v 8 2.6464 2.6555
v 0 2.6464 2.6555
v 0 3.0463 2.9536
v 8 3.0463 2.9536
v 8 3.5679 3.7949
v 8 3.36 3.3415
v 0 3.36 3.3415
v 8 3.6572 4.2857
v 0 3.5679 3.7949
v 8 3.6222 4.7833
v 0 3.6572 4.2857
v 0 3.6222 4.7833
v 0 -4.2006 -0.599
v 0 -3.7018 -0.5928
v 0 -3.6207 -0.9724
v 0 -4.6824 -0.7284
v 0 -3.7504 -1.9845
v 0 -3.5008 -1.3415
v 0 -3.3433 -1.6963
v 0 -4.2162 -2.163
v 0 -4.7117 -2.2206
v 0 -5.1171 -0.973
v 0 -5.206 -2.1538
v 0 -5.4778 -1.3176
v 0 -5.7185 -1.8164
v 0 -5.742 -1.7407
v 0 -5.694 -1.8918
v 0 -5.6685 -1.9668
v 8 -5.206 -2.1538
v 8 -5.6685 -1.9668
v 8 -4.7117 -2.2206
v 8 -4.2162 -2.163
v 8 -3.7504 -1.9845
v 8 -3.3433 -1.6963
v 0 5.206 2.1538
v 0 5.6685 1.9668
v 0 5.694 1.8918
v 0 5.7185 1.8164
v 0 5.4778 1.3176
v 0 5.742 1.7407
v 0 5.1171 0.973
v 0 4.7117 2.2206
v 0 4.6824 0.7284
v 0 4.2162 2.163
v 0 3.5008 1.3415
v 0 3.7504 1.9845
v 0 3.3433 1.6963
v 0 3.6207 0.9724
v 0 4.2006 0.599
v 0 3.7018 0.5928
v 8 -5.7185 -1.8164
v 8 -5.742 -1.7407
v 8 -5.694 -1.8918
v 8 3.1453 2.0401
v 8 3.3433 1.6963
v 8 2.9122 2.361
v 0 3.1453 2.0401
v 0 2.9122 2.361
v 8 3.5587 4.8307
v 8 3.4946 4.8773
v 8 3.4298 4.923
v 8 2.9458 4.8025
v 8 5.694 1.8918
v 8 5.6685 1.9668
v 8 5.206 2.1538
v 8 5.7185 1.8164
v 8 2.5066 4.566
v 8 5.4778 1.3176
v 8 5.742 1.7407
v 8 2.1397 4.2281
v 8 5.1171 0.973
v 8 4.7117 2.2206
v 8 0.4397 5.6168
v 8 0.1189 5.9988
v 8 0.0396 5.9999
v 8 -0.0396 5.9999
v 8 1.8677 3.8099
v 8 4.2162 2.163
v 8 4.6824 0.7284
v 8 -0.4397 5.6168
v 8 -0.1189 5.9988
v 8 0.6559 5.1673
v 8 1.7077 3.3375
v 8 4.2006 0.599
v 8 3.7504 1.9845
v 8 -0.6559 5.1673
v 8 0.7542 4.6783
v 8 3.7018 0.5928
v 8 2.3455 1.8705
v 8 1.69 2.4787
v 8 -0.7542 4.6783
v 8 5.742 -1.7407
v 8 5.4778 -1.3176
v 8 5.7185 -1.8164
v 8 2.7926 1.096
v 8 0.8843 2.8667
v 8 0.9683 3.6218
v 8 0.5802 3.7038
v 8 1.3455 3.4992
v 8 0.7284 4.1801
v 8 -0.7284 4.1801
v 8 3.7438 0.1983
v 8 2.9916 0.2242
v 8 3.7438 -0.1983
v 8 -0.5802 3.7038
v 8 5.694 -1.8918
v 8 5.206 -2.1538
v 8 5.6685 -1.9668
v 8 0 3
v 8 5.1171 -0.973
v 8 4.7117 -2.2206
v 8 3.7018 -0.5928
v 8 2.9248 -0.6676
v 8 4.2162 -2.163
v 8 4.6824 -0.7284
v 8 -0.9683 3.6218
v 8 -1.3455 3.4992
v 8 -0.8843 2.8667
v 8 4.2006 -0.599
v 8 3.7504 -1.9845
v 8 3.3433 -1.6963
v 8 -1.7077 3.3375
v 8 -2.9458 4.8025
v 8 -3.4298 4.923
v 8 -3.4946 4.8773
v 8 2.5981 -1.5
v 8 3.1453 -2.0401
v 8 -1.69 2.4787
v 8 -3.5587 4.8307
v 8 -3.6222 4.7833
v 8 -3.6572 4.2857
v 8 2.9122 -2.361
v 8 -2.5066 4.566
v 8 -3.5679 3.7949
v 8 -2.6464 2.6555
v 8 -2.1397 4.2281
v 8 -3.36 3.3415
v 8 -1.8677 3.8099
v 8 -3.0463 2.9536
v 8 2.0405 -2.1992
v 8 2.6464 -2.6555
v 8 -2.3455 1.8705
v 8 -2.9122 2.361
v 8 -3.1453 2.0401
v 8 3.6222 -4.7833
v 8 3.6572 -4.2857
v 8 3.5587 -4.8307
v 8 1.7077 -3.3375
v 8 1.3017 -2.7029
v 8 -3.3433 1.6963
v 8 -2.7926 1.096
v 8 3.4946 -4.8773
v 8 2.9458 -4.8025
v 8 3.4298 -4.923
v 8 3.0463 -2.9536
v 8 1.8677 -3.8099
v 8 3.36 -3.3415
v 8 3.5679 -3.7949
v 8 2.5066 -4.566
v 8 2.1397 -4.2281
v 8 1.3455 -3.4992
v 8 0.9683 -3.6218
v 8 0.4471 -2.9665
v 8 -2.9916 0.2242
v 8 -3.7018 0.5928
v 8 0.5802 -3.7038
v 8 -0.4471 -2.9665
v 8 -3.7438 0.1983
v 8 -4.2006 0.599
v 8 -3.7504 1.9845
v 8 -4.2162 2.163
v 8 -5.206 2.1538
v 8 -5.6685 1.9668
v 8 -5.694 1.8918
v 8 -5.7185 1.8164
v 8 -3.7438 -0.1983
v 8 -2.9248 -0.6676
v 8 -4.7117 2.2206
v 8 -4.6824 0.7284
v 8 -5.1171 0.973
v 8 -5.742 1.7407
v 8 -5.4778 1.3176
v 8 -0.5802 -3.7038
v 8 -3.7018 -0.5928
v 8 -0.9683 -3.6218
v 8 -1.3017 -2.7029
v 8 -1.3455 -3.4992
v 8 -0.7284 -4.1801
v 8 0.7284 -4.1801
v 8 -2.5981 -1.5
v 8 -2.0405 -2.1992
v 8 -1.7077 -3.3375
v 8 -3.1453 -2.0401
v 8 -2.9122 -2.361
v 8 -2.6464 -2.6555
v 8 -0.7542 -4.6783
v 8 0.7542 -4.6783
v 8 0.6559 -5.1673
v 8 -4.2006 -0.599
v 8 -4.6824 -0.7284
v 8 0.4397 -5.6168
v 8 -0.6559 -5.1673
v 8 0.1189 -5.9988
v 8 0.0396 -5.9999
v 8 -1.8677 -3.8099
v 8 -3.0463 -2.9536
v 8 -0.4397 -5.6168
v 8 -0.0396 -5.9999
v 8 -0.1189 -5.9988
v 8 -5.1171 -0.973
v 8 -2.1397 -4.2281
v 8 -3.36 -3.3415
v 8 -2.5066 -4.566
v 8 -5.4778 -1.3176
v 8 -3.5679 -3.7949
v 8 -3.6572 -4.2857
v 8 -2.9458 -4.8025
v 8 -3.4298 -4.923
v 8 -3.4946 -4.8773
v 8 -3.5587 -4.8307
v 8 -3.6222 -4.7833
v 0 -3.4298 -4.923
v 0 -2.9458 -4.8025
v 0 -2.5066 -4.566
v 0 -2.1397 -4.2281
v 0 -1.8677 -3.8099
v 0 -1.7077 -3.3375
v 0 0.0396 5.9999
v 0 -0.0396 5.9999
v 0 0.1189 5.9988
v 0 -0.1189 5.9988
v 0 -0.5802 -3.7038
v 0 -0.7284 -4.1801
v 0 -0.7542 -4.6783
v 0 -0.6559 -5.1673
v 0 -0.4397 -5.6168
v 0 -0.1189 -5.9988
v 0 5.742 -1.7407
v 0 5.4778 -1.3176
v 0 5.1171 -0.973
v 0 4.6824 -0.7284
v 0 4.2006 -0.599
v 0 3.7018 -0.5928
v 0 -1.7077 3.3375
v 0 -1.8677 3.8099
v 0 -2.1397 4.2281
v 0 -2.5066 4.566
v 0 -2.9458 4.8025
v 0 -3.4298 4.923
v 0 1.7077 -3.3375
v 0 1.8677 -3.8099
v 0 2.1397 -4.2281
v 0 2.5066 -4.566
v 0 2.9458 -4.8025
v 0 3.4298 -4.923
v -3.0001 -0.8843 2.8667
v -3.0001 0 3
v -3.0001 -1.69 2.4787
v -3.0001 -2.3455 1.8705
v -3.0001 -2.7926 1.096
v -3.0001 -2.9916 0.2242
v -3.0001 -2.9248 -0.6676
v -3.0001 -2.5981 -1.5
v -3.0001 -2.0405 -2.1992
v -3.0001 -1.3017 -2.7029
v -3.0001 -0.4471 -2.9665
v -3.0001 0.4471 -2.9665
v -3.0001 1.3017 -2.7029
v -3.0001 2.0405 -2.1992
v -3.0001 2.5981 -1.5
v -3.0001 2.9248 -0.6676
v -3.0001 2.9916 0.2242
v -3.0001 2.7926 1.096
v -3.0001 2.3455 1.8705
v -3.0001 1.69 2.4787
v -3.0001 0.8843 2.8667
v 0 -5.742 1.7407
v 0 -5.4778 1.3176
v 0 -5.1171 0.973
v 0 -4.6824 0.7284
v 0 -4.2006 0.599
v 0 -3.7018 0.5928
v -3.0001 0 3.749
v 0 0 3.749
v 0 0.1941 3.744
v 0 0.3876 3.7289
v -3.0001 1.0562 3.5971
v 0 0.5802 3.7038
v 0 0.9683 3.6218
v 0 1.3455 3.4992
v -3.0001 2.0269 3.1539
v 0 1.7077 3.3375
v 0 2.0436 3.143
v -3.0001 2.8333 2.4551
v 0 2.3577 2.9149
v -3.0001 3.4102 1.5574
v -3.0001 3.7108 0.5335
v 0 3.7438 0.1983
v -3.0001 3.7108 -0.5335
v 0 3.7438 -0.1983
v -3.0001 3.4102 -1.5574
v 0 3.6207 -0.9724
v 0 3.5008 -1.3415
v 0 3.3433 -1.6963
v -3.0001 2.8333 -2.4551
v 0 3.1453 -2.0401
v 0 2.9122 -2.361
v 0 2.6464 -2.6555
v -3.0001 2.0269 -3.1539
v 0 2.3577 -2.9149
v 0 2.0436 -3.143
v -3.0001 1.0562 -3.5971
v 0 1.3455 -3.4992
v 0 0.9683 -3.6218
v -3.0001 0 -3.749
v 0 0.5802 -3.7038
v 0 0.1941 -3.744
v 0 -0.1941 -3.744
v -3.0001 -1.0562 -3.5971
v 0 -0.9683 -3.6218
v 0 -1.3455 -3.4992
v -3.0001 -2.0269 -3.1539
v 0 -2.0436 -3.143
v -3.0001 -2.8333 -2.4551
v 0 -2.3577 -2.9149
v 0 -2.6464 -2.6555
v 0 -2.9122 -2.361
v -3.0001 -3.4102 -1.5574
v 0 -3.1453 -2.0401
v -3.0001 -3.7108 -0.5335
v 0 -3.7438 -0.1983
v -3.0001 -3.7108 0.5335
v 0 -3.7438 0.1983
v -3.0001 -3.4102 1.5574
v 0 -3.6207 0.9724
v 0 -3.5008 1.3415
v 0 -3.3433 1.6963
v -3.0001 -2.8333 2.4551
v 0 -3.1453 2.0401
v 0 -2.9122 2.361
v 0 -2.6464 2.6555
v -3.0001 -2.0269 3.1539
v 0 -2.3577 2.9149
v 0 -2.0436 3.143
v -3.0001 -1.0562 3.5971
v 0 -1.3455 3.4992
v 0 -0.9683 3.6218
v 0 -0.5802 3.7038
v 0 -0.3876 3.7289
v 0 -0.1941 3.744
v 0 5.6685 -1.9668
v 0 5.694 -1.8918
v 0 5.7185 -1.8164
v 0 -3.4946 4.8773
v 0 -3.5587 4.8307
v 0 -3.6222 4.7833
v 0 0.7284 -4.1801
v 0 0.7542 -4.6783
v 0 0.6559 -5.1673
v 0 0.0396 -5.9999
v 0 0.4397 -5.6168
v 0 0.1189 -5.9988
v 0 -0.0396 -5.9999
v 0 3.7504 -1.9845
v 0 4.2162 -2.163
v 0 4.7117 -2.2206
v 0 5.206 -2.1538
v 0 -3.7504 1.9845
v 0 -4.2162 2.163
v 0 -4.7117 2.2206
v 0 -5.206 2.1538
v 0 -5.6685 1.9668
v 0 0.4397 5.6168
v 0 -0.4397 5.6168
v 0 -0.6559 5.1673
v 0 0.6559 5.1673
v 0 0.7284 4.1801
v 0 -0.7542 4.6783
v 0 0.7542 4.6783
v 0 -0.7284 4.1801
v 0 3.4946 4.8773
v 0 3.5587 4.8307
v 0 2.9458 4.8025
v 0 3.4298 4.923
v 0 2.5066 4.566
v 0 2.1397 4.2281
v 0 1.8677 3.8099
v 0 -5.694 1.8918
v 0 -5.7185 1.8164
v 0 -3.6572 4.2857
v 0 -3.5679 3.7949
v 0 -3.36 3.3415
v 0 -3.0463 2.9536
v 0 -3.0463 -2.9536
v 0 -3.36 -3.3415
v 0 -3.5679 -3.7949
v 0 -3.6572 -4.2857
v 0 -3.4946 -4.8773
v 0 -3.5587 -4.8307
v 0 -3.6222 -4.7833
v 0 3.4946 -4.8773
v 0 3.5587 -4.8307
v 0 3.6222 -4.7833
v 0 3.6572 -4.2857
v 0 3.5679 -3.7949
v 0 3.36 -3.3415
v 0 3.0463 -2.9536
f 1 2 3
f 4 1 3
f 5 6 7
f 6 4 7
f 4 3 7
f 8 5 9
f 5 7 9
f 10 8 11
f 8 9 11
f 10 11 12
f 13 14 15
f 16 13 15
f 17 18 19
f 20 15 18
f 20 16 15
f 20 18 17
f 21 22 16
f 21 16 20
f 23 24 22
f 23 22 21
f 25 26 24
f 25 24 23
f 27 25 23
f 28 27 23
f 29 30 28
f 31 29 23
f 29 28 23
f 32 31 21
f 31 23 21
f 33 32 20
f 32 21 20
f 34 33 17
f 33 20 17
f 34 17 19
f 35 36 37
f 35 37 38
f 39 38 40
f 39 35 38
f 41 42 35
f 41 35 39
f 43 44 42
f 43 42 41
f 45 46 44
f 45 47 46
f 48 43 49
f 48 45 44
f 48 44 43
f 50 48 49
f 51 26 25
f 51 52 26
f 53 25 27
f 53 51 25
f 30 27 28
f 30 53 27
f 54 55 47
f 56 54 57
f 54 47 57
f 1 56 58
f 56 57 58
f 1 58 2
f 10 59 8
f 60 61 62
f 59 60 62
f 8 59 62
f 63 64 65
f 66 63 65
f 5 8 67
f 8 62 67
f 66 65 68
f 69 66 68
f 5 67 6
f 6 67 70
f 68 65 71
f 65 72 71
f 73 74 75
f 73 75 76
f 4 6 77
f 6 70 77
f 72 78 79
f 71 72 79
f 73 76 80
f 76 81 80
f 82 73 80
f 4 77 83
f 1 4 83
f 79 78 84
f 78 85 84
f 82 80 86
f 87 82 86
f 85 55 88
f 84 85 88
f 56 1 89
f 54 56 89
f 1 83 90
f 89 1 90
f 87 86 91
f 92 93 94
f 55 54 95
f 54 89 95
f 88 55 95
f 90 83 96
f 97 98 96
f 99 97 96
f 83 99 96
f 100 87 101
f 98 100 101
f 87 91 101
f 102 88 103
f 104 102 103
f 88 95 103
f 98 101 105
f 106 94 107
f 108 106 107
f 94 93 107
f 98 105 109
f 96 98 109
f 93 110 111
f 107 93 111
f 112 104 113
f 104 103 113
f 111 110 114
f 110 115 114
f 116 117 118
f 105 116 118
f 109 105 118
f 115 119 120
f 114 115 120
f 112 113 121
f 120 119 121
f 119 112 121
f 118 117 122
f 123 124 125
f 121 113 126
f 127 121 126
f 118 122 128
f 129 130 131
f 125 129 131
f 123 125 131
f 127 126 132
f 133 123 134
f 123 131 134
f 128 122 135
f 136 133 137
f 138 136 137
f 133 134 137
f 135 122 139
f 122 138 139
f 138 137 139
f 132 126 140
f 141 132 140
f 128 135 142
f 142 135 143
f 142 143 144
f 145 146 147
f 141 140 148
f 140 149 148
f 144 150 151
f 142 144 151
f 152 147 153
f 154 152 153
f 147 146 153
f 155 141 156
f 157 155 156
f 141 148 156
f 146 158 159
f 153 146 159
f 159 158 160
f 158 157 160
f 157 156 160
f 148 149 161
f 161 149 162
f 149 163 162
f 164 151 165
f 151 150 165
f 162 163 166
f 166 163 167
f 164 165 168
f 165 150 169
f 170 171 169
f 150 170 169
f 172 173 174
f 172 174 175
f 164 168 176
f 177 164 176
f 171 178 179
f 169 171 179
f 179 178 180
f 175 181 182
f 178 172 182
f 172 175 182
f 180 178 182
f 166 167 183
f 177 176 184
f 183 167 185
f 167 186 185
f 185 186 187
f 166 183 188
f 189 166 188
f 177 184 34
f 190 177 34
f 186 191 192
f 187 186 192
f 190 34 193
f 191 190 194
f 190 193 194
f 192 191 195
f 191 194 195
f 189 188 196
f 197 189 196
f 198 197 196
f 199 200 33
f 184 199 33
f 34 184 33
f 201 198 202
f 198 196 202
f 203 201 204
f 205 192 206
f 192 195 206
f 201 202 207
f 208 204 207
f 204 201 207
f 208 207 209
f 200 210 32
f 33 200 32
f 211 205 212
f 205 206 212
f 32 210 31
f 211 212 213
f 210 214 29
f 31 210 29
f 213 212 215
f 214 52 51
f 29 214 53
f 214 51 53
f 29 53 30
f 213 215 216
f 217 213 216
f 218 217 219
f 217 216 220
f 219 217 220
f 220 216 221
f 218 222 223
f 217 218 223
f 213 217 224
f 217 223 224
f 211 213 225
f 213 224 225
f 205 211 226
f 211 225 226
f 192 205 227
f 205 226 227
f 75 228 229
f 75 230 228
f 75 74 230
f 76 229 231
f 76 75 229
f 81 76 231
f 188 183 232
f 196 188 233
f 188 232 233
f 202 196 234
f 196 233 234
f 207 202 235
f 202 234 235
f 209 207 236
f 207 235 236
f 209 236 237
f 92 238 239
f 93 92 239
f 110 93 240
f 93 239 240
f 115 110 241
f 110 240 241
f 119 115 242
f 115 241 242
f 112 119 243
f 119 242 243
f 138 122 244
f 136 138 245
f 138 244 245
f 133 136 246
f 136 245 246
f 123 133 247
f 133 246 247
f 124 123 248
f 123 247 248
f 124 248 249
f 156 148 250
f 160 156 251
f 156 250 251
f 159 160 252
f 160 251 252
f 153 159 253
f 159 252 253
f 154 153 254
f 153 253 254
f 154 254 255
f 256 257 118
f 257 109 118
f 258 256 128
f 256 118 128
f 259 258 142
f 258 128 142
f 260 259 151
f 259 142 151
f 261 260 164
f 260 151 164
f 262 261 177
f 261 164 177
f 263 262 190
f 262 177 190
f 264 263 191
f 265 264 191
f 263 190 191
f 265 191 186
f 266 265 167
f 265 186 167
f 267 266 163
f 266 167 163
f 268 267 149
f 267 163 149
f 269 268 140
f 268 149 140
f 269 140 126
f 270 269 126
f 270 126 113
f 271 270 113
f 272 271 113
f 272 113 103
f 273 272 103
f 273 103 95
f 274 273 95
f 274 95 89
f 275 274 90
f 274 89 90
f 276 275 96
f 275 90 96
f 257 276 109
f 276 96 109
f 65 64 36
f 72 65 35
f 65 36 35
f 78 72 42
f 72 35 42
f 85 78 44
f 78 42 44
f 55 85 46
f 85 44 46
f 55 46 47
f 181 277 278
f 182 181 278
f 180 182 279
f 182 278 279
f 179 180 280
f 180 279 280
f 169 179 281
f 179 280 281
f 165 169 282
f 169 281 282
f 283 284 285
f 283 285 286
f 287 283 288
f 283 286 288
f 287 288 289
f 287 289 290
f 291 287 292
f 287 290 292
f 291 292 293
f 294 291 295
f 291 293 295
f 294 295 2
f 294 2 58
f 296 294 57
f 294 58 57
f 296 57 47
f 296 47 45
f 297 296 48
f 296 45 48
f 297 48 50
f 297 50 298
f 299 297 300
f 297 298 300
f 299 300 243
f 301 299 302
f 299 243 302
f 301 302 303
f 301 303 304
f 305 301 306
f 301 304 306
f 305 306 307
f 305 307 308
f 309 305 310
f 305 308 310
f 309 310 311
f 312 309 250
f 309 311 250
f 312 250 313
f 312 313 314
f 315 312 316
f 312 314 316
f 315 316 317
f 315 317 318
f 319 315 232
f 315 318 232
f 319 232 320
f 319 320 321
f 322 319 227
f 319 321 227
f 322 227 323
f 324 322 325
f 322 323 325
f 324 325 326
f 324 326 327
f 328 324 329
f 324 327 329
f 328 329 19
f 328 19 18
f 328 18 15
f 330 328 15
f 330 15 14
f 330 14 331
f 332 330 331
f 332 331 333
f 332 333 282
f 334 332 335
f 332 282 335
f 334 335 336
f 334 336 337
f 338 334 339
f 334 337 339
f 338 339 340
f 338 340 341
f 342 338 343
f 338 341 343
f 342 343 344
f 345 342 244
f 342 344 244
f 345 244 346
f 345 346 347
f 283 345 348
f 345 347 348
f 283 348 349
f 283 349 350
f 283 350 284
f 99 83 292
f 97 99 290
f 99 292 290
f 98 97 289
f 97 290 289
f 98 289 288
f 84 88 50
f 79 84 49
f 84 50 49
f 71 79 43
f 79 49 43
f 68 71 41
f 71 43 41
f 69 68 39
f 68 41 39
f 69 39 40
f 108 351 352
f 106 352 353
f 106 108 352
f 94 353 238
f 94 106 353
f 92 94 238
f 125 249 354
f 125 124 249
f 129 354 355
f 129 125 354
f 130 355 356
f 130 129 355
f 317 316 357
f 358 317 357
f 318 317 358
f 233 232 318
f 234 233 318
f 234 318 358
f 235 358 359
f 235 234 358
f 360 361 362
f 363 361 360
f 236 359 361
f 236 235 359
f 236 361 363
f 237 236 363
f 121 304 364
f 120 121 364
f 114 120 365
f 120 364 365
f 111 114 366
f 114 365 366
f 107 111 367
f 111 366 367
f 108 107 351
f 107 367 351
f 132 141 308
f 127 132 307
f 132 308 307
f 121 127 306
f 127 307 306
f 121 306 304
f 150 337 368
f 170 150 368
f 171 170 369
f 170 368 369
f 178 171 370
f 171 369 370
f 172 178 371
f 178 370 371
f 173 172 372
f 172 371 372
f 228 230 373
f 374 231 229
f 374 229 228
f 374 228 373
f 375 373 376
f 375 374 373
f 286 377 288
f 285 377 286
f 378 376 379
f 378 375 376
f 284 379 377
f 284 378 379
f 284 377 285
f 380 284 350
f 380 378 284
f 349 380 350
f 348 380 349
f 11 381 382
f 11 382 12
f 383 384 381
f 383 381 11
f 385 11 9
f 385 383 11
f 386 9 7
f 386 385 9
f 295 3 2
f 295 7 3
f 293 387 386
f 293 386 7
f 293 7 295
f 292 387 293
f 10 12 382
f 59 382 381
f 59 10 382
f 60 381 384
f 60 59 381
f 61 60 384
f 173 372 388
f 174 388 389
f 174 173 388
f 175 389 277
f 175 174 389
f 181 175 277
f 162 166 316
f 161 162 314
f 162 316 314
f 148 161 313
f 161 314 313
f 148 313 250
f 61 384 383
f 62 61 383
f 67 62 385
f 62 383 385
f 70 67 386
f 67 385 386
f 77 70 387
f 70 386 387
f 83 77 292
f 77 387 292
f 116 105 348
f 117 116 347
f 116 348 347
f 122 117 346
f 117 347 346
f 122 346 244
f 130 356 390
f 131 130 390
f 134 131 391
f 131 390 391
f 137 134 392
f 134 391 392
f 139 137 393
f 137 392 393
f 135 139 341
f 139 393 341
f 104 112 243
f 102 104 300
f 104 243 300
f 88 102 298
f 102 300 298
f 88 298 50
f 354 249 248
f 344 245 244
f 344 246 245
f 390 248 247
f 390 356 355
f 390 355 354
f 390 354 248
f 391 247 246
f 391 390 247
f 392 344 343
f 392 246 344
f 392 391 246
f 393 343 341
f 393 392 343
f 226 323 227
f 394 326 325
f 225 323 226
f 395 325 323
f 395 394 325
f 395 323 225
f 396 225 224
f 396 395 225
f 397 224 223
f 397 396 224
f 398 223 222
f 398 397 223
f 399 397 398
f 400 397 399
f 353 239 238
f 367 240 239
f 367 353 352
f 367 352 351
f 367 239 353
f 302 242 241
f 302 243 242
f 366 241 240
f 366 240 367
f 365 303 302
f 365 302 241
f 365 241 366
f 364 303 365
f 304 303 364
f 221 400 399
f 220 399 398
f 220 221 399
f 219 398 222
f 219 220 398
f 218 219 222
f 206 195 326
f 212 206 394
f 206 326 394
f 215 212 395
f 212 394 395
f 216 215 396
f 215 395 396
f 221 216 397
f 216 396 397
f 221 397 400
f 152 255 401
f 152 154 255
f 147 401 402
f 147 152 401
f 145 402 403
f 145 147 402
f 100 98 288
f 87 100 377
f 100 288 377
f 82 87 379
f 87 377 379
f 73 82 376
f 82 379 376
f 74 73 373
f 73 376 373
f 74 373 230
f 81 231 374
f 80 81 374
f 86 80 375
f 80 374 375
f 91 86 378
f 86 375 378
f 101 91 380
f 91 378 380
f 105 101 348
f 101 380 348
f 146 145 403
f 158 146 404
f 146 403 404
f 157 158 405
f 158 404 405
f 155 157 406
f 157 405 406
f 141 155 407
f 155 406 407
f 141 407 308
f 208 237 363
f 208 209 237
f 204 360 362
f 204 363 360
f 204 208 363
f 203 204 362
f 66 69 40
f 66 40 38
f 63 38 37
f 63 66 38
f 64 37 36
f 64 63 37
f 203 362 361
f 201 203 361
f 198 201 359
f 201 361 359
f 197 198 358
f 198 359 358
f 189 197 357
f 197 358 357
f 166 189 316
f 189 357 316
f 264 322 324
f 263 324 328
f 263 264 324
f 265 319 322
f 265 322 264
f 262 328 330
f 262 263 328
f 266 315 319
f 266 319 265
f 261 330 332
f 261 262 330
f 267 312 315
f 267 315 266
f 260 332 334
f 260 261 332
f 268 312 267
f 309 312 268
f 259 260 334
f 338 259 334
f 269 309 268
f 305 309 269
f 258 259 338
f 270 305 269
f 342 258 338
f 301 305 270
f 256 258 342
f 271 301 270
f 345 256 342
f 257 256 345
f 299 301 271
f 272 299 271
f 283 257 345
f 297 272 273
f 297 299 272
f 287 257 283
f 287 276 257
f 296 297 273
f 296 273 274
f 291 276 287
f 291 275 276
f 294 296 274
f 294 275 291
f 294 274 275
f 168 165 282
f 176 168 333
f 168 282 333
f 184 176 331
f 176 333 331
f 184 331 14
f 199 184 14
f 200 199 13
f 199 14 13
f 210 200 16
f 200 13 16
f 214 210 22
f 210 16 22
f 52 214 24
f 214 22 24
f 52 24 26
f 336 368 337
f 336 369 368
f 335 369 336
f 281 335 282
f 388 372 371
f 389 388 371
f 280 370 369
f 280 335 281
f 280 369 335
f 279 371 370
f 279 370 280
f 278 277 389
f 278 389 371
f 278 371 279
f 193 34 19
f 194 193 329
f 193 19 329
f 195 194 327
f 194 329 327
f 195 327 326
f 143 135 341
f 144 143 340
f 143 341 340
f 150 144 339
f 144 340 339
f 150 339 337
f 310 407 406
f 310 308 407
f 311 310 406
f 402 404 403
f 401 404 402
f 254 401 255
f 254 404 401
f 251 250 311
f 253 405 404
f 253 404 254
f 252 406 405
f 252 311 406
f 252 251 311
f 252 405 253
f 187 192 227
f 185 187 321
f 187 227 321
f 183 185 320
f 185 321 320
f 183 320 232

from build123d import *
from build123d.topology import SkipClean

# Parameters (mm, degrees)
BASPROSKE_W      = 8
BASPROSKE_H      = 6
TOOTHCUT_DEPTH   = 12.66190379
TEETHCUTS_COUNT  = 10
TEETHCUTS_ANGLE  = 324
HUBNEAONESKE_R   = 3.749
HUBNEARONE_DEPTH = 3.0000508
BORSKE_R         = 3
BORE_DEPTH       = 11.0000508


with BuildPart() as part:
    # BasProSke → Base-Revolve (revolve)
    with BuildSketch(Plane(origin=(0, 0, 0), x_dir=(1, 0, 0), z_dir=(0, 1, 0)), mode=Mode.PRIVATE) as base_revolve_sk:
        with Locations((4, 3)):
            Rectangle(BASPROSKE_W, BASPROSKE_H)
    revolve(base_revolve_sk.sketch.rotate(Axis((-10, 0, 0), (1, 0, 0)), 180), axis=Axis((-10, 0, 0), (1, 0, 0)))

    # TooCutSke → ToothCut (cut, through all)
    with BuildSketch(Plane(origin=(0, 0, 0), x_dir=(0, 0, -1), z_dir=(1, 0, 0))):
        with BuildLine():
            ThreePointArc((0.59278292, 3.701838653), (0, 3.749), (-0.59278292, 3.701838653))
            ThreePointArc((-0.59278292, 3.701838653), (-0.846593509, 4.924114224), (-1.775771316, 5.757784417))
            ThreePointArc((-1.775771316, 5.757784417), (0, 6.0254), (1.775771316, 5.757784417))
            ThreePointArc((1.775771316, 5.757784417), (0.846593509, 4.924114224), (0.59278292, 3.701838653))
        make_face()
    toothcut = extrude(amount=TOOTHCUT_DEPTH, mode=Mode.SUBTRACT)

    # TeethCuts: ToothCut ×10 about axis
    teethcuts_axis = Axis((0, 0, 0), (1, 0, 0))
    for i in range(1, TEETHCUTS_COUNT):
        add(toothcut.rotate(teethcuts_axis, i * TEETHCUTS_ANGLE / (TEETHCUTS_COUNT - 1)), mode=Mode.SUBTRACT)

    # HubNeaOneSke → HubNearOne (add)
    with SkipClean():  # the faces are left unmerged after this step: merging them gives an invalid solid
        with BuildSketch(Plane.ZY):
            Circle(HUBNEAONESKE_R)
        extrude(amount=HUBNEARONE_DEPTH)

    # BorSke → Bore (cut, symmetric)
    with SkipClean():  # the faces are left unmerged after this step: merging them gives an invalid solid
        with BuildSketch(Plane(origin=(0, 0, 0), x_dir=(0, 0, -1), z_dir=(1, 0, 0))):
            with Locations(Location((0, 0, 0), (0, 0, 180))):
                Circle(BORSKE_R)
        extrude(amount=BORE_DEPTH, both=True, mode=Mode.SUBTRACT)


solid = part.part
